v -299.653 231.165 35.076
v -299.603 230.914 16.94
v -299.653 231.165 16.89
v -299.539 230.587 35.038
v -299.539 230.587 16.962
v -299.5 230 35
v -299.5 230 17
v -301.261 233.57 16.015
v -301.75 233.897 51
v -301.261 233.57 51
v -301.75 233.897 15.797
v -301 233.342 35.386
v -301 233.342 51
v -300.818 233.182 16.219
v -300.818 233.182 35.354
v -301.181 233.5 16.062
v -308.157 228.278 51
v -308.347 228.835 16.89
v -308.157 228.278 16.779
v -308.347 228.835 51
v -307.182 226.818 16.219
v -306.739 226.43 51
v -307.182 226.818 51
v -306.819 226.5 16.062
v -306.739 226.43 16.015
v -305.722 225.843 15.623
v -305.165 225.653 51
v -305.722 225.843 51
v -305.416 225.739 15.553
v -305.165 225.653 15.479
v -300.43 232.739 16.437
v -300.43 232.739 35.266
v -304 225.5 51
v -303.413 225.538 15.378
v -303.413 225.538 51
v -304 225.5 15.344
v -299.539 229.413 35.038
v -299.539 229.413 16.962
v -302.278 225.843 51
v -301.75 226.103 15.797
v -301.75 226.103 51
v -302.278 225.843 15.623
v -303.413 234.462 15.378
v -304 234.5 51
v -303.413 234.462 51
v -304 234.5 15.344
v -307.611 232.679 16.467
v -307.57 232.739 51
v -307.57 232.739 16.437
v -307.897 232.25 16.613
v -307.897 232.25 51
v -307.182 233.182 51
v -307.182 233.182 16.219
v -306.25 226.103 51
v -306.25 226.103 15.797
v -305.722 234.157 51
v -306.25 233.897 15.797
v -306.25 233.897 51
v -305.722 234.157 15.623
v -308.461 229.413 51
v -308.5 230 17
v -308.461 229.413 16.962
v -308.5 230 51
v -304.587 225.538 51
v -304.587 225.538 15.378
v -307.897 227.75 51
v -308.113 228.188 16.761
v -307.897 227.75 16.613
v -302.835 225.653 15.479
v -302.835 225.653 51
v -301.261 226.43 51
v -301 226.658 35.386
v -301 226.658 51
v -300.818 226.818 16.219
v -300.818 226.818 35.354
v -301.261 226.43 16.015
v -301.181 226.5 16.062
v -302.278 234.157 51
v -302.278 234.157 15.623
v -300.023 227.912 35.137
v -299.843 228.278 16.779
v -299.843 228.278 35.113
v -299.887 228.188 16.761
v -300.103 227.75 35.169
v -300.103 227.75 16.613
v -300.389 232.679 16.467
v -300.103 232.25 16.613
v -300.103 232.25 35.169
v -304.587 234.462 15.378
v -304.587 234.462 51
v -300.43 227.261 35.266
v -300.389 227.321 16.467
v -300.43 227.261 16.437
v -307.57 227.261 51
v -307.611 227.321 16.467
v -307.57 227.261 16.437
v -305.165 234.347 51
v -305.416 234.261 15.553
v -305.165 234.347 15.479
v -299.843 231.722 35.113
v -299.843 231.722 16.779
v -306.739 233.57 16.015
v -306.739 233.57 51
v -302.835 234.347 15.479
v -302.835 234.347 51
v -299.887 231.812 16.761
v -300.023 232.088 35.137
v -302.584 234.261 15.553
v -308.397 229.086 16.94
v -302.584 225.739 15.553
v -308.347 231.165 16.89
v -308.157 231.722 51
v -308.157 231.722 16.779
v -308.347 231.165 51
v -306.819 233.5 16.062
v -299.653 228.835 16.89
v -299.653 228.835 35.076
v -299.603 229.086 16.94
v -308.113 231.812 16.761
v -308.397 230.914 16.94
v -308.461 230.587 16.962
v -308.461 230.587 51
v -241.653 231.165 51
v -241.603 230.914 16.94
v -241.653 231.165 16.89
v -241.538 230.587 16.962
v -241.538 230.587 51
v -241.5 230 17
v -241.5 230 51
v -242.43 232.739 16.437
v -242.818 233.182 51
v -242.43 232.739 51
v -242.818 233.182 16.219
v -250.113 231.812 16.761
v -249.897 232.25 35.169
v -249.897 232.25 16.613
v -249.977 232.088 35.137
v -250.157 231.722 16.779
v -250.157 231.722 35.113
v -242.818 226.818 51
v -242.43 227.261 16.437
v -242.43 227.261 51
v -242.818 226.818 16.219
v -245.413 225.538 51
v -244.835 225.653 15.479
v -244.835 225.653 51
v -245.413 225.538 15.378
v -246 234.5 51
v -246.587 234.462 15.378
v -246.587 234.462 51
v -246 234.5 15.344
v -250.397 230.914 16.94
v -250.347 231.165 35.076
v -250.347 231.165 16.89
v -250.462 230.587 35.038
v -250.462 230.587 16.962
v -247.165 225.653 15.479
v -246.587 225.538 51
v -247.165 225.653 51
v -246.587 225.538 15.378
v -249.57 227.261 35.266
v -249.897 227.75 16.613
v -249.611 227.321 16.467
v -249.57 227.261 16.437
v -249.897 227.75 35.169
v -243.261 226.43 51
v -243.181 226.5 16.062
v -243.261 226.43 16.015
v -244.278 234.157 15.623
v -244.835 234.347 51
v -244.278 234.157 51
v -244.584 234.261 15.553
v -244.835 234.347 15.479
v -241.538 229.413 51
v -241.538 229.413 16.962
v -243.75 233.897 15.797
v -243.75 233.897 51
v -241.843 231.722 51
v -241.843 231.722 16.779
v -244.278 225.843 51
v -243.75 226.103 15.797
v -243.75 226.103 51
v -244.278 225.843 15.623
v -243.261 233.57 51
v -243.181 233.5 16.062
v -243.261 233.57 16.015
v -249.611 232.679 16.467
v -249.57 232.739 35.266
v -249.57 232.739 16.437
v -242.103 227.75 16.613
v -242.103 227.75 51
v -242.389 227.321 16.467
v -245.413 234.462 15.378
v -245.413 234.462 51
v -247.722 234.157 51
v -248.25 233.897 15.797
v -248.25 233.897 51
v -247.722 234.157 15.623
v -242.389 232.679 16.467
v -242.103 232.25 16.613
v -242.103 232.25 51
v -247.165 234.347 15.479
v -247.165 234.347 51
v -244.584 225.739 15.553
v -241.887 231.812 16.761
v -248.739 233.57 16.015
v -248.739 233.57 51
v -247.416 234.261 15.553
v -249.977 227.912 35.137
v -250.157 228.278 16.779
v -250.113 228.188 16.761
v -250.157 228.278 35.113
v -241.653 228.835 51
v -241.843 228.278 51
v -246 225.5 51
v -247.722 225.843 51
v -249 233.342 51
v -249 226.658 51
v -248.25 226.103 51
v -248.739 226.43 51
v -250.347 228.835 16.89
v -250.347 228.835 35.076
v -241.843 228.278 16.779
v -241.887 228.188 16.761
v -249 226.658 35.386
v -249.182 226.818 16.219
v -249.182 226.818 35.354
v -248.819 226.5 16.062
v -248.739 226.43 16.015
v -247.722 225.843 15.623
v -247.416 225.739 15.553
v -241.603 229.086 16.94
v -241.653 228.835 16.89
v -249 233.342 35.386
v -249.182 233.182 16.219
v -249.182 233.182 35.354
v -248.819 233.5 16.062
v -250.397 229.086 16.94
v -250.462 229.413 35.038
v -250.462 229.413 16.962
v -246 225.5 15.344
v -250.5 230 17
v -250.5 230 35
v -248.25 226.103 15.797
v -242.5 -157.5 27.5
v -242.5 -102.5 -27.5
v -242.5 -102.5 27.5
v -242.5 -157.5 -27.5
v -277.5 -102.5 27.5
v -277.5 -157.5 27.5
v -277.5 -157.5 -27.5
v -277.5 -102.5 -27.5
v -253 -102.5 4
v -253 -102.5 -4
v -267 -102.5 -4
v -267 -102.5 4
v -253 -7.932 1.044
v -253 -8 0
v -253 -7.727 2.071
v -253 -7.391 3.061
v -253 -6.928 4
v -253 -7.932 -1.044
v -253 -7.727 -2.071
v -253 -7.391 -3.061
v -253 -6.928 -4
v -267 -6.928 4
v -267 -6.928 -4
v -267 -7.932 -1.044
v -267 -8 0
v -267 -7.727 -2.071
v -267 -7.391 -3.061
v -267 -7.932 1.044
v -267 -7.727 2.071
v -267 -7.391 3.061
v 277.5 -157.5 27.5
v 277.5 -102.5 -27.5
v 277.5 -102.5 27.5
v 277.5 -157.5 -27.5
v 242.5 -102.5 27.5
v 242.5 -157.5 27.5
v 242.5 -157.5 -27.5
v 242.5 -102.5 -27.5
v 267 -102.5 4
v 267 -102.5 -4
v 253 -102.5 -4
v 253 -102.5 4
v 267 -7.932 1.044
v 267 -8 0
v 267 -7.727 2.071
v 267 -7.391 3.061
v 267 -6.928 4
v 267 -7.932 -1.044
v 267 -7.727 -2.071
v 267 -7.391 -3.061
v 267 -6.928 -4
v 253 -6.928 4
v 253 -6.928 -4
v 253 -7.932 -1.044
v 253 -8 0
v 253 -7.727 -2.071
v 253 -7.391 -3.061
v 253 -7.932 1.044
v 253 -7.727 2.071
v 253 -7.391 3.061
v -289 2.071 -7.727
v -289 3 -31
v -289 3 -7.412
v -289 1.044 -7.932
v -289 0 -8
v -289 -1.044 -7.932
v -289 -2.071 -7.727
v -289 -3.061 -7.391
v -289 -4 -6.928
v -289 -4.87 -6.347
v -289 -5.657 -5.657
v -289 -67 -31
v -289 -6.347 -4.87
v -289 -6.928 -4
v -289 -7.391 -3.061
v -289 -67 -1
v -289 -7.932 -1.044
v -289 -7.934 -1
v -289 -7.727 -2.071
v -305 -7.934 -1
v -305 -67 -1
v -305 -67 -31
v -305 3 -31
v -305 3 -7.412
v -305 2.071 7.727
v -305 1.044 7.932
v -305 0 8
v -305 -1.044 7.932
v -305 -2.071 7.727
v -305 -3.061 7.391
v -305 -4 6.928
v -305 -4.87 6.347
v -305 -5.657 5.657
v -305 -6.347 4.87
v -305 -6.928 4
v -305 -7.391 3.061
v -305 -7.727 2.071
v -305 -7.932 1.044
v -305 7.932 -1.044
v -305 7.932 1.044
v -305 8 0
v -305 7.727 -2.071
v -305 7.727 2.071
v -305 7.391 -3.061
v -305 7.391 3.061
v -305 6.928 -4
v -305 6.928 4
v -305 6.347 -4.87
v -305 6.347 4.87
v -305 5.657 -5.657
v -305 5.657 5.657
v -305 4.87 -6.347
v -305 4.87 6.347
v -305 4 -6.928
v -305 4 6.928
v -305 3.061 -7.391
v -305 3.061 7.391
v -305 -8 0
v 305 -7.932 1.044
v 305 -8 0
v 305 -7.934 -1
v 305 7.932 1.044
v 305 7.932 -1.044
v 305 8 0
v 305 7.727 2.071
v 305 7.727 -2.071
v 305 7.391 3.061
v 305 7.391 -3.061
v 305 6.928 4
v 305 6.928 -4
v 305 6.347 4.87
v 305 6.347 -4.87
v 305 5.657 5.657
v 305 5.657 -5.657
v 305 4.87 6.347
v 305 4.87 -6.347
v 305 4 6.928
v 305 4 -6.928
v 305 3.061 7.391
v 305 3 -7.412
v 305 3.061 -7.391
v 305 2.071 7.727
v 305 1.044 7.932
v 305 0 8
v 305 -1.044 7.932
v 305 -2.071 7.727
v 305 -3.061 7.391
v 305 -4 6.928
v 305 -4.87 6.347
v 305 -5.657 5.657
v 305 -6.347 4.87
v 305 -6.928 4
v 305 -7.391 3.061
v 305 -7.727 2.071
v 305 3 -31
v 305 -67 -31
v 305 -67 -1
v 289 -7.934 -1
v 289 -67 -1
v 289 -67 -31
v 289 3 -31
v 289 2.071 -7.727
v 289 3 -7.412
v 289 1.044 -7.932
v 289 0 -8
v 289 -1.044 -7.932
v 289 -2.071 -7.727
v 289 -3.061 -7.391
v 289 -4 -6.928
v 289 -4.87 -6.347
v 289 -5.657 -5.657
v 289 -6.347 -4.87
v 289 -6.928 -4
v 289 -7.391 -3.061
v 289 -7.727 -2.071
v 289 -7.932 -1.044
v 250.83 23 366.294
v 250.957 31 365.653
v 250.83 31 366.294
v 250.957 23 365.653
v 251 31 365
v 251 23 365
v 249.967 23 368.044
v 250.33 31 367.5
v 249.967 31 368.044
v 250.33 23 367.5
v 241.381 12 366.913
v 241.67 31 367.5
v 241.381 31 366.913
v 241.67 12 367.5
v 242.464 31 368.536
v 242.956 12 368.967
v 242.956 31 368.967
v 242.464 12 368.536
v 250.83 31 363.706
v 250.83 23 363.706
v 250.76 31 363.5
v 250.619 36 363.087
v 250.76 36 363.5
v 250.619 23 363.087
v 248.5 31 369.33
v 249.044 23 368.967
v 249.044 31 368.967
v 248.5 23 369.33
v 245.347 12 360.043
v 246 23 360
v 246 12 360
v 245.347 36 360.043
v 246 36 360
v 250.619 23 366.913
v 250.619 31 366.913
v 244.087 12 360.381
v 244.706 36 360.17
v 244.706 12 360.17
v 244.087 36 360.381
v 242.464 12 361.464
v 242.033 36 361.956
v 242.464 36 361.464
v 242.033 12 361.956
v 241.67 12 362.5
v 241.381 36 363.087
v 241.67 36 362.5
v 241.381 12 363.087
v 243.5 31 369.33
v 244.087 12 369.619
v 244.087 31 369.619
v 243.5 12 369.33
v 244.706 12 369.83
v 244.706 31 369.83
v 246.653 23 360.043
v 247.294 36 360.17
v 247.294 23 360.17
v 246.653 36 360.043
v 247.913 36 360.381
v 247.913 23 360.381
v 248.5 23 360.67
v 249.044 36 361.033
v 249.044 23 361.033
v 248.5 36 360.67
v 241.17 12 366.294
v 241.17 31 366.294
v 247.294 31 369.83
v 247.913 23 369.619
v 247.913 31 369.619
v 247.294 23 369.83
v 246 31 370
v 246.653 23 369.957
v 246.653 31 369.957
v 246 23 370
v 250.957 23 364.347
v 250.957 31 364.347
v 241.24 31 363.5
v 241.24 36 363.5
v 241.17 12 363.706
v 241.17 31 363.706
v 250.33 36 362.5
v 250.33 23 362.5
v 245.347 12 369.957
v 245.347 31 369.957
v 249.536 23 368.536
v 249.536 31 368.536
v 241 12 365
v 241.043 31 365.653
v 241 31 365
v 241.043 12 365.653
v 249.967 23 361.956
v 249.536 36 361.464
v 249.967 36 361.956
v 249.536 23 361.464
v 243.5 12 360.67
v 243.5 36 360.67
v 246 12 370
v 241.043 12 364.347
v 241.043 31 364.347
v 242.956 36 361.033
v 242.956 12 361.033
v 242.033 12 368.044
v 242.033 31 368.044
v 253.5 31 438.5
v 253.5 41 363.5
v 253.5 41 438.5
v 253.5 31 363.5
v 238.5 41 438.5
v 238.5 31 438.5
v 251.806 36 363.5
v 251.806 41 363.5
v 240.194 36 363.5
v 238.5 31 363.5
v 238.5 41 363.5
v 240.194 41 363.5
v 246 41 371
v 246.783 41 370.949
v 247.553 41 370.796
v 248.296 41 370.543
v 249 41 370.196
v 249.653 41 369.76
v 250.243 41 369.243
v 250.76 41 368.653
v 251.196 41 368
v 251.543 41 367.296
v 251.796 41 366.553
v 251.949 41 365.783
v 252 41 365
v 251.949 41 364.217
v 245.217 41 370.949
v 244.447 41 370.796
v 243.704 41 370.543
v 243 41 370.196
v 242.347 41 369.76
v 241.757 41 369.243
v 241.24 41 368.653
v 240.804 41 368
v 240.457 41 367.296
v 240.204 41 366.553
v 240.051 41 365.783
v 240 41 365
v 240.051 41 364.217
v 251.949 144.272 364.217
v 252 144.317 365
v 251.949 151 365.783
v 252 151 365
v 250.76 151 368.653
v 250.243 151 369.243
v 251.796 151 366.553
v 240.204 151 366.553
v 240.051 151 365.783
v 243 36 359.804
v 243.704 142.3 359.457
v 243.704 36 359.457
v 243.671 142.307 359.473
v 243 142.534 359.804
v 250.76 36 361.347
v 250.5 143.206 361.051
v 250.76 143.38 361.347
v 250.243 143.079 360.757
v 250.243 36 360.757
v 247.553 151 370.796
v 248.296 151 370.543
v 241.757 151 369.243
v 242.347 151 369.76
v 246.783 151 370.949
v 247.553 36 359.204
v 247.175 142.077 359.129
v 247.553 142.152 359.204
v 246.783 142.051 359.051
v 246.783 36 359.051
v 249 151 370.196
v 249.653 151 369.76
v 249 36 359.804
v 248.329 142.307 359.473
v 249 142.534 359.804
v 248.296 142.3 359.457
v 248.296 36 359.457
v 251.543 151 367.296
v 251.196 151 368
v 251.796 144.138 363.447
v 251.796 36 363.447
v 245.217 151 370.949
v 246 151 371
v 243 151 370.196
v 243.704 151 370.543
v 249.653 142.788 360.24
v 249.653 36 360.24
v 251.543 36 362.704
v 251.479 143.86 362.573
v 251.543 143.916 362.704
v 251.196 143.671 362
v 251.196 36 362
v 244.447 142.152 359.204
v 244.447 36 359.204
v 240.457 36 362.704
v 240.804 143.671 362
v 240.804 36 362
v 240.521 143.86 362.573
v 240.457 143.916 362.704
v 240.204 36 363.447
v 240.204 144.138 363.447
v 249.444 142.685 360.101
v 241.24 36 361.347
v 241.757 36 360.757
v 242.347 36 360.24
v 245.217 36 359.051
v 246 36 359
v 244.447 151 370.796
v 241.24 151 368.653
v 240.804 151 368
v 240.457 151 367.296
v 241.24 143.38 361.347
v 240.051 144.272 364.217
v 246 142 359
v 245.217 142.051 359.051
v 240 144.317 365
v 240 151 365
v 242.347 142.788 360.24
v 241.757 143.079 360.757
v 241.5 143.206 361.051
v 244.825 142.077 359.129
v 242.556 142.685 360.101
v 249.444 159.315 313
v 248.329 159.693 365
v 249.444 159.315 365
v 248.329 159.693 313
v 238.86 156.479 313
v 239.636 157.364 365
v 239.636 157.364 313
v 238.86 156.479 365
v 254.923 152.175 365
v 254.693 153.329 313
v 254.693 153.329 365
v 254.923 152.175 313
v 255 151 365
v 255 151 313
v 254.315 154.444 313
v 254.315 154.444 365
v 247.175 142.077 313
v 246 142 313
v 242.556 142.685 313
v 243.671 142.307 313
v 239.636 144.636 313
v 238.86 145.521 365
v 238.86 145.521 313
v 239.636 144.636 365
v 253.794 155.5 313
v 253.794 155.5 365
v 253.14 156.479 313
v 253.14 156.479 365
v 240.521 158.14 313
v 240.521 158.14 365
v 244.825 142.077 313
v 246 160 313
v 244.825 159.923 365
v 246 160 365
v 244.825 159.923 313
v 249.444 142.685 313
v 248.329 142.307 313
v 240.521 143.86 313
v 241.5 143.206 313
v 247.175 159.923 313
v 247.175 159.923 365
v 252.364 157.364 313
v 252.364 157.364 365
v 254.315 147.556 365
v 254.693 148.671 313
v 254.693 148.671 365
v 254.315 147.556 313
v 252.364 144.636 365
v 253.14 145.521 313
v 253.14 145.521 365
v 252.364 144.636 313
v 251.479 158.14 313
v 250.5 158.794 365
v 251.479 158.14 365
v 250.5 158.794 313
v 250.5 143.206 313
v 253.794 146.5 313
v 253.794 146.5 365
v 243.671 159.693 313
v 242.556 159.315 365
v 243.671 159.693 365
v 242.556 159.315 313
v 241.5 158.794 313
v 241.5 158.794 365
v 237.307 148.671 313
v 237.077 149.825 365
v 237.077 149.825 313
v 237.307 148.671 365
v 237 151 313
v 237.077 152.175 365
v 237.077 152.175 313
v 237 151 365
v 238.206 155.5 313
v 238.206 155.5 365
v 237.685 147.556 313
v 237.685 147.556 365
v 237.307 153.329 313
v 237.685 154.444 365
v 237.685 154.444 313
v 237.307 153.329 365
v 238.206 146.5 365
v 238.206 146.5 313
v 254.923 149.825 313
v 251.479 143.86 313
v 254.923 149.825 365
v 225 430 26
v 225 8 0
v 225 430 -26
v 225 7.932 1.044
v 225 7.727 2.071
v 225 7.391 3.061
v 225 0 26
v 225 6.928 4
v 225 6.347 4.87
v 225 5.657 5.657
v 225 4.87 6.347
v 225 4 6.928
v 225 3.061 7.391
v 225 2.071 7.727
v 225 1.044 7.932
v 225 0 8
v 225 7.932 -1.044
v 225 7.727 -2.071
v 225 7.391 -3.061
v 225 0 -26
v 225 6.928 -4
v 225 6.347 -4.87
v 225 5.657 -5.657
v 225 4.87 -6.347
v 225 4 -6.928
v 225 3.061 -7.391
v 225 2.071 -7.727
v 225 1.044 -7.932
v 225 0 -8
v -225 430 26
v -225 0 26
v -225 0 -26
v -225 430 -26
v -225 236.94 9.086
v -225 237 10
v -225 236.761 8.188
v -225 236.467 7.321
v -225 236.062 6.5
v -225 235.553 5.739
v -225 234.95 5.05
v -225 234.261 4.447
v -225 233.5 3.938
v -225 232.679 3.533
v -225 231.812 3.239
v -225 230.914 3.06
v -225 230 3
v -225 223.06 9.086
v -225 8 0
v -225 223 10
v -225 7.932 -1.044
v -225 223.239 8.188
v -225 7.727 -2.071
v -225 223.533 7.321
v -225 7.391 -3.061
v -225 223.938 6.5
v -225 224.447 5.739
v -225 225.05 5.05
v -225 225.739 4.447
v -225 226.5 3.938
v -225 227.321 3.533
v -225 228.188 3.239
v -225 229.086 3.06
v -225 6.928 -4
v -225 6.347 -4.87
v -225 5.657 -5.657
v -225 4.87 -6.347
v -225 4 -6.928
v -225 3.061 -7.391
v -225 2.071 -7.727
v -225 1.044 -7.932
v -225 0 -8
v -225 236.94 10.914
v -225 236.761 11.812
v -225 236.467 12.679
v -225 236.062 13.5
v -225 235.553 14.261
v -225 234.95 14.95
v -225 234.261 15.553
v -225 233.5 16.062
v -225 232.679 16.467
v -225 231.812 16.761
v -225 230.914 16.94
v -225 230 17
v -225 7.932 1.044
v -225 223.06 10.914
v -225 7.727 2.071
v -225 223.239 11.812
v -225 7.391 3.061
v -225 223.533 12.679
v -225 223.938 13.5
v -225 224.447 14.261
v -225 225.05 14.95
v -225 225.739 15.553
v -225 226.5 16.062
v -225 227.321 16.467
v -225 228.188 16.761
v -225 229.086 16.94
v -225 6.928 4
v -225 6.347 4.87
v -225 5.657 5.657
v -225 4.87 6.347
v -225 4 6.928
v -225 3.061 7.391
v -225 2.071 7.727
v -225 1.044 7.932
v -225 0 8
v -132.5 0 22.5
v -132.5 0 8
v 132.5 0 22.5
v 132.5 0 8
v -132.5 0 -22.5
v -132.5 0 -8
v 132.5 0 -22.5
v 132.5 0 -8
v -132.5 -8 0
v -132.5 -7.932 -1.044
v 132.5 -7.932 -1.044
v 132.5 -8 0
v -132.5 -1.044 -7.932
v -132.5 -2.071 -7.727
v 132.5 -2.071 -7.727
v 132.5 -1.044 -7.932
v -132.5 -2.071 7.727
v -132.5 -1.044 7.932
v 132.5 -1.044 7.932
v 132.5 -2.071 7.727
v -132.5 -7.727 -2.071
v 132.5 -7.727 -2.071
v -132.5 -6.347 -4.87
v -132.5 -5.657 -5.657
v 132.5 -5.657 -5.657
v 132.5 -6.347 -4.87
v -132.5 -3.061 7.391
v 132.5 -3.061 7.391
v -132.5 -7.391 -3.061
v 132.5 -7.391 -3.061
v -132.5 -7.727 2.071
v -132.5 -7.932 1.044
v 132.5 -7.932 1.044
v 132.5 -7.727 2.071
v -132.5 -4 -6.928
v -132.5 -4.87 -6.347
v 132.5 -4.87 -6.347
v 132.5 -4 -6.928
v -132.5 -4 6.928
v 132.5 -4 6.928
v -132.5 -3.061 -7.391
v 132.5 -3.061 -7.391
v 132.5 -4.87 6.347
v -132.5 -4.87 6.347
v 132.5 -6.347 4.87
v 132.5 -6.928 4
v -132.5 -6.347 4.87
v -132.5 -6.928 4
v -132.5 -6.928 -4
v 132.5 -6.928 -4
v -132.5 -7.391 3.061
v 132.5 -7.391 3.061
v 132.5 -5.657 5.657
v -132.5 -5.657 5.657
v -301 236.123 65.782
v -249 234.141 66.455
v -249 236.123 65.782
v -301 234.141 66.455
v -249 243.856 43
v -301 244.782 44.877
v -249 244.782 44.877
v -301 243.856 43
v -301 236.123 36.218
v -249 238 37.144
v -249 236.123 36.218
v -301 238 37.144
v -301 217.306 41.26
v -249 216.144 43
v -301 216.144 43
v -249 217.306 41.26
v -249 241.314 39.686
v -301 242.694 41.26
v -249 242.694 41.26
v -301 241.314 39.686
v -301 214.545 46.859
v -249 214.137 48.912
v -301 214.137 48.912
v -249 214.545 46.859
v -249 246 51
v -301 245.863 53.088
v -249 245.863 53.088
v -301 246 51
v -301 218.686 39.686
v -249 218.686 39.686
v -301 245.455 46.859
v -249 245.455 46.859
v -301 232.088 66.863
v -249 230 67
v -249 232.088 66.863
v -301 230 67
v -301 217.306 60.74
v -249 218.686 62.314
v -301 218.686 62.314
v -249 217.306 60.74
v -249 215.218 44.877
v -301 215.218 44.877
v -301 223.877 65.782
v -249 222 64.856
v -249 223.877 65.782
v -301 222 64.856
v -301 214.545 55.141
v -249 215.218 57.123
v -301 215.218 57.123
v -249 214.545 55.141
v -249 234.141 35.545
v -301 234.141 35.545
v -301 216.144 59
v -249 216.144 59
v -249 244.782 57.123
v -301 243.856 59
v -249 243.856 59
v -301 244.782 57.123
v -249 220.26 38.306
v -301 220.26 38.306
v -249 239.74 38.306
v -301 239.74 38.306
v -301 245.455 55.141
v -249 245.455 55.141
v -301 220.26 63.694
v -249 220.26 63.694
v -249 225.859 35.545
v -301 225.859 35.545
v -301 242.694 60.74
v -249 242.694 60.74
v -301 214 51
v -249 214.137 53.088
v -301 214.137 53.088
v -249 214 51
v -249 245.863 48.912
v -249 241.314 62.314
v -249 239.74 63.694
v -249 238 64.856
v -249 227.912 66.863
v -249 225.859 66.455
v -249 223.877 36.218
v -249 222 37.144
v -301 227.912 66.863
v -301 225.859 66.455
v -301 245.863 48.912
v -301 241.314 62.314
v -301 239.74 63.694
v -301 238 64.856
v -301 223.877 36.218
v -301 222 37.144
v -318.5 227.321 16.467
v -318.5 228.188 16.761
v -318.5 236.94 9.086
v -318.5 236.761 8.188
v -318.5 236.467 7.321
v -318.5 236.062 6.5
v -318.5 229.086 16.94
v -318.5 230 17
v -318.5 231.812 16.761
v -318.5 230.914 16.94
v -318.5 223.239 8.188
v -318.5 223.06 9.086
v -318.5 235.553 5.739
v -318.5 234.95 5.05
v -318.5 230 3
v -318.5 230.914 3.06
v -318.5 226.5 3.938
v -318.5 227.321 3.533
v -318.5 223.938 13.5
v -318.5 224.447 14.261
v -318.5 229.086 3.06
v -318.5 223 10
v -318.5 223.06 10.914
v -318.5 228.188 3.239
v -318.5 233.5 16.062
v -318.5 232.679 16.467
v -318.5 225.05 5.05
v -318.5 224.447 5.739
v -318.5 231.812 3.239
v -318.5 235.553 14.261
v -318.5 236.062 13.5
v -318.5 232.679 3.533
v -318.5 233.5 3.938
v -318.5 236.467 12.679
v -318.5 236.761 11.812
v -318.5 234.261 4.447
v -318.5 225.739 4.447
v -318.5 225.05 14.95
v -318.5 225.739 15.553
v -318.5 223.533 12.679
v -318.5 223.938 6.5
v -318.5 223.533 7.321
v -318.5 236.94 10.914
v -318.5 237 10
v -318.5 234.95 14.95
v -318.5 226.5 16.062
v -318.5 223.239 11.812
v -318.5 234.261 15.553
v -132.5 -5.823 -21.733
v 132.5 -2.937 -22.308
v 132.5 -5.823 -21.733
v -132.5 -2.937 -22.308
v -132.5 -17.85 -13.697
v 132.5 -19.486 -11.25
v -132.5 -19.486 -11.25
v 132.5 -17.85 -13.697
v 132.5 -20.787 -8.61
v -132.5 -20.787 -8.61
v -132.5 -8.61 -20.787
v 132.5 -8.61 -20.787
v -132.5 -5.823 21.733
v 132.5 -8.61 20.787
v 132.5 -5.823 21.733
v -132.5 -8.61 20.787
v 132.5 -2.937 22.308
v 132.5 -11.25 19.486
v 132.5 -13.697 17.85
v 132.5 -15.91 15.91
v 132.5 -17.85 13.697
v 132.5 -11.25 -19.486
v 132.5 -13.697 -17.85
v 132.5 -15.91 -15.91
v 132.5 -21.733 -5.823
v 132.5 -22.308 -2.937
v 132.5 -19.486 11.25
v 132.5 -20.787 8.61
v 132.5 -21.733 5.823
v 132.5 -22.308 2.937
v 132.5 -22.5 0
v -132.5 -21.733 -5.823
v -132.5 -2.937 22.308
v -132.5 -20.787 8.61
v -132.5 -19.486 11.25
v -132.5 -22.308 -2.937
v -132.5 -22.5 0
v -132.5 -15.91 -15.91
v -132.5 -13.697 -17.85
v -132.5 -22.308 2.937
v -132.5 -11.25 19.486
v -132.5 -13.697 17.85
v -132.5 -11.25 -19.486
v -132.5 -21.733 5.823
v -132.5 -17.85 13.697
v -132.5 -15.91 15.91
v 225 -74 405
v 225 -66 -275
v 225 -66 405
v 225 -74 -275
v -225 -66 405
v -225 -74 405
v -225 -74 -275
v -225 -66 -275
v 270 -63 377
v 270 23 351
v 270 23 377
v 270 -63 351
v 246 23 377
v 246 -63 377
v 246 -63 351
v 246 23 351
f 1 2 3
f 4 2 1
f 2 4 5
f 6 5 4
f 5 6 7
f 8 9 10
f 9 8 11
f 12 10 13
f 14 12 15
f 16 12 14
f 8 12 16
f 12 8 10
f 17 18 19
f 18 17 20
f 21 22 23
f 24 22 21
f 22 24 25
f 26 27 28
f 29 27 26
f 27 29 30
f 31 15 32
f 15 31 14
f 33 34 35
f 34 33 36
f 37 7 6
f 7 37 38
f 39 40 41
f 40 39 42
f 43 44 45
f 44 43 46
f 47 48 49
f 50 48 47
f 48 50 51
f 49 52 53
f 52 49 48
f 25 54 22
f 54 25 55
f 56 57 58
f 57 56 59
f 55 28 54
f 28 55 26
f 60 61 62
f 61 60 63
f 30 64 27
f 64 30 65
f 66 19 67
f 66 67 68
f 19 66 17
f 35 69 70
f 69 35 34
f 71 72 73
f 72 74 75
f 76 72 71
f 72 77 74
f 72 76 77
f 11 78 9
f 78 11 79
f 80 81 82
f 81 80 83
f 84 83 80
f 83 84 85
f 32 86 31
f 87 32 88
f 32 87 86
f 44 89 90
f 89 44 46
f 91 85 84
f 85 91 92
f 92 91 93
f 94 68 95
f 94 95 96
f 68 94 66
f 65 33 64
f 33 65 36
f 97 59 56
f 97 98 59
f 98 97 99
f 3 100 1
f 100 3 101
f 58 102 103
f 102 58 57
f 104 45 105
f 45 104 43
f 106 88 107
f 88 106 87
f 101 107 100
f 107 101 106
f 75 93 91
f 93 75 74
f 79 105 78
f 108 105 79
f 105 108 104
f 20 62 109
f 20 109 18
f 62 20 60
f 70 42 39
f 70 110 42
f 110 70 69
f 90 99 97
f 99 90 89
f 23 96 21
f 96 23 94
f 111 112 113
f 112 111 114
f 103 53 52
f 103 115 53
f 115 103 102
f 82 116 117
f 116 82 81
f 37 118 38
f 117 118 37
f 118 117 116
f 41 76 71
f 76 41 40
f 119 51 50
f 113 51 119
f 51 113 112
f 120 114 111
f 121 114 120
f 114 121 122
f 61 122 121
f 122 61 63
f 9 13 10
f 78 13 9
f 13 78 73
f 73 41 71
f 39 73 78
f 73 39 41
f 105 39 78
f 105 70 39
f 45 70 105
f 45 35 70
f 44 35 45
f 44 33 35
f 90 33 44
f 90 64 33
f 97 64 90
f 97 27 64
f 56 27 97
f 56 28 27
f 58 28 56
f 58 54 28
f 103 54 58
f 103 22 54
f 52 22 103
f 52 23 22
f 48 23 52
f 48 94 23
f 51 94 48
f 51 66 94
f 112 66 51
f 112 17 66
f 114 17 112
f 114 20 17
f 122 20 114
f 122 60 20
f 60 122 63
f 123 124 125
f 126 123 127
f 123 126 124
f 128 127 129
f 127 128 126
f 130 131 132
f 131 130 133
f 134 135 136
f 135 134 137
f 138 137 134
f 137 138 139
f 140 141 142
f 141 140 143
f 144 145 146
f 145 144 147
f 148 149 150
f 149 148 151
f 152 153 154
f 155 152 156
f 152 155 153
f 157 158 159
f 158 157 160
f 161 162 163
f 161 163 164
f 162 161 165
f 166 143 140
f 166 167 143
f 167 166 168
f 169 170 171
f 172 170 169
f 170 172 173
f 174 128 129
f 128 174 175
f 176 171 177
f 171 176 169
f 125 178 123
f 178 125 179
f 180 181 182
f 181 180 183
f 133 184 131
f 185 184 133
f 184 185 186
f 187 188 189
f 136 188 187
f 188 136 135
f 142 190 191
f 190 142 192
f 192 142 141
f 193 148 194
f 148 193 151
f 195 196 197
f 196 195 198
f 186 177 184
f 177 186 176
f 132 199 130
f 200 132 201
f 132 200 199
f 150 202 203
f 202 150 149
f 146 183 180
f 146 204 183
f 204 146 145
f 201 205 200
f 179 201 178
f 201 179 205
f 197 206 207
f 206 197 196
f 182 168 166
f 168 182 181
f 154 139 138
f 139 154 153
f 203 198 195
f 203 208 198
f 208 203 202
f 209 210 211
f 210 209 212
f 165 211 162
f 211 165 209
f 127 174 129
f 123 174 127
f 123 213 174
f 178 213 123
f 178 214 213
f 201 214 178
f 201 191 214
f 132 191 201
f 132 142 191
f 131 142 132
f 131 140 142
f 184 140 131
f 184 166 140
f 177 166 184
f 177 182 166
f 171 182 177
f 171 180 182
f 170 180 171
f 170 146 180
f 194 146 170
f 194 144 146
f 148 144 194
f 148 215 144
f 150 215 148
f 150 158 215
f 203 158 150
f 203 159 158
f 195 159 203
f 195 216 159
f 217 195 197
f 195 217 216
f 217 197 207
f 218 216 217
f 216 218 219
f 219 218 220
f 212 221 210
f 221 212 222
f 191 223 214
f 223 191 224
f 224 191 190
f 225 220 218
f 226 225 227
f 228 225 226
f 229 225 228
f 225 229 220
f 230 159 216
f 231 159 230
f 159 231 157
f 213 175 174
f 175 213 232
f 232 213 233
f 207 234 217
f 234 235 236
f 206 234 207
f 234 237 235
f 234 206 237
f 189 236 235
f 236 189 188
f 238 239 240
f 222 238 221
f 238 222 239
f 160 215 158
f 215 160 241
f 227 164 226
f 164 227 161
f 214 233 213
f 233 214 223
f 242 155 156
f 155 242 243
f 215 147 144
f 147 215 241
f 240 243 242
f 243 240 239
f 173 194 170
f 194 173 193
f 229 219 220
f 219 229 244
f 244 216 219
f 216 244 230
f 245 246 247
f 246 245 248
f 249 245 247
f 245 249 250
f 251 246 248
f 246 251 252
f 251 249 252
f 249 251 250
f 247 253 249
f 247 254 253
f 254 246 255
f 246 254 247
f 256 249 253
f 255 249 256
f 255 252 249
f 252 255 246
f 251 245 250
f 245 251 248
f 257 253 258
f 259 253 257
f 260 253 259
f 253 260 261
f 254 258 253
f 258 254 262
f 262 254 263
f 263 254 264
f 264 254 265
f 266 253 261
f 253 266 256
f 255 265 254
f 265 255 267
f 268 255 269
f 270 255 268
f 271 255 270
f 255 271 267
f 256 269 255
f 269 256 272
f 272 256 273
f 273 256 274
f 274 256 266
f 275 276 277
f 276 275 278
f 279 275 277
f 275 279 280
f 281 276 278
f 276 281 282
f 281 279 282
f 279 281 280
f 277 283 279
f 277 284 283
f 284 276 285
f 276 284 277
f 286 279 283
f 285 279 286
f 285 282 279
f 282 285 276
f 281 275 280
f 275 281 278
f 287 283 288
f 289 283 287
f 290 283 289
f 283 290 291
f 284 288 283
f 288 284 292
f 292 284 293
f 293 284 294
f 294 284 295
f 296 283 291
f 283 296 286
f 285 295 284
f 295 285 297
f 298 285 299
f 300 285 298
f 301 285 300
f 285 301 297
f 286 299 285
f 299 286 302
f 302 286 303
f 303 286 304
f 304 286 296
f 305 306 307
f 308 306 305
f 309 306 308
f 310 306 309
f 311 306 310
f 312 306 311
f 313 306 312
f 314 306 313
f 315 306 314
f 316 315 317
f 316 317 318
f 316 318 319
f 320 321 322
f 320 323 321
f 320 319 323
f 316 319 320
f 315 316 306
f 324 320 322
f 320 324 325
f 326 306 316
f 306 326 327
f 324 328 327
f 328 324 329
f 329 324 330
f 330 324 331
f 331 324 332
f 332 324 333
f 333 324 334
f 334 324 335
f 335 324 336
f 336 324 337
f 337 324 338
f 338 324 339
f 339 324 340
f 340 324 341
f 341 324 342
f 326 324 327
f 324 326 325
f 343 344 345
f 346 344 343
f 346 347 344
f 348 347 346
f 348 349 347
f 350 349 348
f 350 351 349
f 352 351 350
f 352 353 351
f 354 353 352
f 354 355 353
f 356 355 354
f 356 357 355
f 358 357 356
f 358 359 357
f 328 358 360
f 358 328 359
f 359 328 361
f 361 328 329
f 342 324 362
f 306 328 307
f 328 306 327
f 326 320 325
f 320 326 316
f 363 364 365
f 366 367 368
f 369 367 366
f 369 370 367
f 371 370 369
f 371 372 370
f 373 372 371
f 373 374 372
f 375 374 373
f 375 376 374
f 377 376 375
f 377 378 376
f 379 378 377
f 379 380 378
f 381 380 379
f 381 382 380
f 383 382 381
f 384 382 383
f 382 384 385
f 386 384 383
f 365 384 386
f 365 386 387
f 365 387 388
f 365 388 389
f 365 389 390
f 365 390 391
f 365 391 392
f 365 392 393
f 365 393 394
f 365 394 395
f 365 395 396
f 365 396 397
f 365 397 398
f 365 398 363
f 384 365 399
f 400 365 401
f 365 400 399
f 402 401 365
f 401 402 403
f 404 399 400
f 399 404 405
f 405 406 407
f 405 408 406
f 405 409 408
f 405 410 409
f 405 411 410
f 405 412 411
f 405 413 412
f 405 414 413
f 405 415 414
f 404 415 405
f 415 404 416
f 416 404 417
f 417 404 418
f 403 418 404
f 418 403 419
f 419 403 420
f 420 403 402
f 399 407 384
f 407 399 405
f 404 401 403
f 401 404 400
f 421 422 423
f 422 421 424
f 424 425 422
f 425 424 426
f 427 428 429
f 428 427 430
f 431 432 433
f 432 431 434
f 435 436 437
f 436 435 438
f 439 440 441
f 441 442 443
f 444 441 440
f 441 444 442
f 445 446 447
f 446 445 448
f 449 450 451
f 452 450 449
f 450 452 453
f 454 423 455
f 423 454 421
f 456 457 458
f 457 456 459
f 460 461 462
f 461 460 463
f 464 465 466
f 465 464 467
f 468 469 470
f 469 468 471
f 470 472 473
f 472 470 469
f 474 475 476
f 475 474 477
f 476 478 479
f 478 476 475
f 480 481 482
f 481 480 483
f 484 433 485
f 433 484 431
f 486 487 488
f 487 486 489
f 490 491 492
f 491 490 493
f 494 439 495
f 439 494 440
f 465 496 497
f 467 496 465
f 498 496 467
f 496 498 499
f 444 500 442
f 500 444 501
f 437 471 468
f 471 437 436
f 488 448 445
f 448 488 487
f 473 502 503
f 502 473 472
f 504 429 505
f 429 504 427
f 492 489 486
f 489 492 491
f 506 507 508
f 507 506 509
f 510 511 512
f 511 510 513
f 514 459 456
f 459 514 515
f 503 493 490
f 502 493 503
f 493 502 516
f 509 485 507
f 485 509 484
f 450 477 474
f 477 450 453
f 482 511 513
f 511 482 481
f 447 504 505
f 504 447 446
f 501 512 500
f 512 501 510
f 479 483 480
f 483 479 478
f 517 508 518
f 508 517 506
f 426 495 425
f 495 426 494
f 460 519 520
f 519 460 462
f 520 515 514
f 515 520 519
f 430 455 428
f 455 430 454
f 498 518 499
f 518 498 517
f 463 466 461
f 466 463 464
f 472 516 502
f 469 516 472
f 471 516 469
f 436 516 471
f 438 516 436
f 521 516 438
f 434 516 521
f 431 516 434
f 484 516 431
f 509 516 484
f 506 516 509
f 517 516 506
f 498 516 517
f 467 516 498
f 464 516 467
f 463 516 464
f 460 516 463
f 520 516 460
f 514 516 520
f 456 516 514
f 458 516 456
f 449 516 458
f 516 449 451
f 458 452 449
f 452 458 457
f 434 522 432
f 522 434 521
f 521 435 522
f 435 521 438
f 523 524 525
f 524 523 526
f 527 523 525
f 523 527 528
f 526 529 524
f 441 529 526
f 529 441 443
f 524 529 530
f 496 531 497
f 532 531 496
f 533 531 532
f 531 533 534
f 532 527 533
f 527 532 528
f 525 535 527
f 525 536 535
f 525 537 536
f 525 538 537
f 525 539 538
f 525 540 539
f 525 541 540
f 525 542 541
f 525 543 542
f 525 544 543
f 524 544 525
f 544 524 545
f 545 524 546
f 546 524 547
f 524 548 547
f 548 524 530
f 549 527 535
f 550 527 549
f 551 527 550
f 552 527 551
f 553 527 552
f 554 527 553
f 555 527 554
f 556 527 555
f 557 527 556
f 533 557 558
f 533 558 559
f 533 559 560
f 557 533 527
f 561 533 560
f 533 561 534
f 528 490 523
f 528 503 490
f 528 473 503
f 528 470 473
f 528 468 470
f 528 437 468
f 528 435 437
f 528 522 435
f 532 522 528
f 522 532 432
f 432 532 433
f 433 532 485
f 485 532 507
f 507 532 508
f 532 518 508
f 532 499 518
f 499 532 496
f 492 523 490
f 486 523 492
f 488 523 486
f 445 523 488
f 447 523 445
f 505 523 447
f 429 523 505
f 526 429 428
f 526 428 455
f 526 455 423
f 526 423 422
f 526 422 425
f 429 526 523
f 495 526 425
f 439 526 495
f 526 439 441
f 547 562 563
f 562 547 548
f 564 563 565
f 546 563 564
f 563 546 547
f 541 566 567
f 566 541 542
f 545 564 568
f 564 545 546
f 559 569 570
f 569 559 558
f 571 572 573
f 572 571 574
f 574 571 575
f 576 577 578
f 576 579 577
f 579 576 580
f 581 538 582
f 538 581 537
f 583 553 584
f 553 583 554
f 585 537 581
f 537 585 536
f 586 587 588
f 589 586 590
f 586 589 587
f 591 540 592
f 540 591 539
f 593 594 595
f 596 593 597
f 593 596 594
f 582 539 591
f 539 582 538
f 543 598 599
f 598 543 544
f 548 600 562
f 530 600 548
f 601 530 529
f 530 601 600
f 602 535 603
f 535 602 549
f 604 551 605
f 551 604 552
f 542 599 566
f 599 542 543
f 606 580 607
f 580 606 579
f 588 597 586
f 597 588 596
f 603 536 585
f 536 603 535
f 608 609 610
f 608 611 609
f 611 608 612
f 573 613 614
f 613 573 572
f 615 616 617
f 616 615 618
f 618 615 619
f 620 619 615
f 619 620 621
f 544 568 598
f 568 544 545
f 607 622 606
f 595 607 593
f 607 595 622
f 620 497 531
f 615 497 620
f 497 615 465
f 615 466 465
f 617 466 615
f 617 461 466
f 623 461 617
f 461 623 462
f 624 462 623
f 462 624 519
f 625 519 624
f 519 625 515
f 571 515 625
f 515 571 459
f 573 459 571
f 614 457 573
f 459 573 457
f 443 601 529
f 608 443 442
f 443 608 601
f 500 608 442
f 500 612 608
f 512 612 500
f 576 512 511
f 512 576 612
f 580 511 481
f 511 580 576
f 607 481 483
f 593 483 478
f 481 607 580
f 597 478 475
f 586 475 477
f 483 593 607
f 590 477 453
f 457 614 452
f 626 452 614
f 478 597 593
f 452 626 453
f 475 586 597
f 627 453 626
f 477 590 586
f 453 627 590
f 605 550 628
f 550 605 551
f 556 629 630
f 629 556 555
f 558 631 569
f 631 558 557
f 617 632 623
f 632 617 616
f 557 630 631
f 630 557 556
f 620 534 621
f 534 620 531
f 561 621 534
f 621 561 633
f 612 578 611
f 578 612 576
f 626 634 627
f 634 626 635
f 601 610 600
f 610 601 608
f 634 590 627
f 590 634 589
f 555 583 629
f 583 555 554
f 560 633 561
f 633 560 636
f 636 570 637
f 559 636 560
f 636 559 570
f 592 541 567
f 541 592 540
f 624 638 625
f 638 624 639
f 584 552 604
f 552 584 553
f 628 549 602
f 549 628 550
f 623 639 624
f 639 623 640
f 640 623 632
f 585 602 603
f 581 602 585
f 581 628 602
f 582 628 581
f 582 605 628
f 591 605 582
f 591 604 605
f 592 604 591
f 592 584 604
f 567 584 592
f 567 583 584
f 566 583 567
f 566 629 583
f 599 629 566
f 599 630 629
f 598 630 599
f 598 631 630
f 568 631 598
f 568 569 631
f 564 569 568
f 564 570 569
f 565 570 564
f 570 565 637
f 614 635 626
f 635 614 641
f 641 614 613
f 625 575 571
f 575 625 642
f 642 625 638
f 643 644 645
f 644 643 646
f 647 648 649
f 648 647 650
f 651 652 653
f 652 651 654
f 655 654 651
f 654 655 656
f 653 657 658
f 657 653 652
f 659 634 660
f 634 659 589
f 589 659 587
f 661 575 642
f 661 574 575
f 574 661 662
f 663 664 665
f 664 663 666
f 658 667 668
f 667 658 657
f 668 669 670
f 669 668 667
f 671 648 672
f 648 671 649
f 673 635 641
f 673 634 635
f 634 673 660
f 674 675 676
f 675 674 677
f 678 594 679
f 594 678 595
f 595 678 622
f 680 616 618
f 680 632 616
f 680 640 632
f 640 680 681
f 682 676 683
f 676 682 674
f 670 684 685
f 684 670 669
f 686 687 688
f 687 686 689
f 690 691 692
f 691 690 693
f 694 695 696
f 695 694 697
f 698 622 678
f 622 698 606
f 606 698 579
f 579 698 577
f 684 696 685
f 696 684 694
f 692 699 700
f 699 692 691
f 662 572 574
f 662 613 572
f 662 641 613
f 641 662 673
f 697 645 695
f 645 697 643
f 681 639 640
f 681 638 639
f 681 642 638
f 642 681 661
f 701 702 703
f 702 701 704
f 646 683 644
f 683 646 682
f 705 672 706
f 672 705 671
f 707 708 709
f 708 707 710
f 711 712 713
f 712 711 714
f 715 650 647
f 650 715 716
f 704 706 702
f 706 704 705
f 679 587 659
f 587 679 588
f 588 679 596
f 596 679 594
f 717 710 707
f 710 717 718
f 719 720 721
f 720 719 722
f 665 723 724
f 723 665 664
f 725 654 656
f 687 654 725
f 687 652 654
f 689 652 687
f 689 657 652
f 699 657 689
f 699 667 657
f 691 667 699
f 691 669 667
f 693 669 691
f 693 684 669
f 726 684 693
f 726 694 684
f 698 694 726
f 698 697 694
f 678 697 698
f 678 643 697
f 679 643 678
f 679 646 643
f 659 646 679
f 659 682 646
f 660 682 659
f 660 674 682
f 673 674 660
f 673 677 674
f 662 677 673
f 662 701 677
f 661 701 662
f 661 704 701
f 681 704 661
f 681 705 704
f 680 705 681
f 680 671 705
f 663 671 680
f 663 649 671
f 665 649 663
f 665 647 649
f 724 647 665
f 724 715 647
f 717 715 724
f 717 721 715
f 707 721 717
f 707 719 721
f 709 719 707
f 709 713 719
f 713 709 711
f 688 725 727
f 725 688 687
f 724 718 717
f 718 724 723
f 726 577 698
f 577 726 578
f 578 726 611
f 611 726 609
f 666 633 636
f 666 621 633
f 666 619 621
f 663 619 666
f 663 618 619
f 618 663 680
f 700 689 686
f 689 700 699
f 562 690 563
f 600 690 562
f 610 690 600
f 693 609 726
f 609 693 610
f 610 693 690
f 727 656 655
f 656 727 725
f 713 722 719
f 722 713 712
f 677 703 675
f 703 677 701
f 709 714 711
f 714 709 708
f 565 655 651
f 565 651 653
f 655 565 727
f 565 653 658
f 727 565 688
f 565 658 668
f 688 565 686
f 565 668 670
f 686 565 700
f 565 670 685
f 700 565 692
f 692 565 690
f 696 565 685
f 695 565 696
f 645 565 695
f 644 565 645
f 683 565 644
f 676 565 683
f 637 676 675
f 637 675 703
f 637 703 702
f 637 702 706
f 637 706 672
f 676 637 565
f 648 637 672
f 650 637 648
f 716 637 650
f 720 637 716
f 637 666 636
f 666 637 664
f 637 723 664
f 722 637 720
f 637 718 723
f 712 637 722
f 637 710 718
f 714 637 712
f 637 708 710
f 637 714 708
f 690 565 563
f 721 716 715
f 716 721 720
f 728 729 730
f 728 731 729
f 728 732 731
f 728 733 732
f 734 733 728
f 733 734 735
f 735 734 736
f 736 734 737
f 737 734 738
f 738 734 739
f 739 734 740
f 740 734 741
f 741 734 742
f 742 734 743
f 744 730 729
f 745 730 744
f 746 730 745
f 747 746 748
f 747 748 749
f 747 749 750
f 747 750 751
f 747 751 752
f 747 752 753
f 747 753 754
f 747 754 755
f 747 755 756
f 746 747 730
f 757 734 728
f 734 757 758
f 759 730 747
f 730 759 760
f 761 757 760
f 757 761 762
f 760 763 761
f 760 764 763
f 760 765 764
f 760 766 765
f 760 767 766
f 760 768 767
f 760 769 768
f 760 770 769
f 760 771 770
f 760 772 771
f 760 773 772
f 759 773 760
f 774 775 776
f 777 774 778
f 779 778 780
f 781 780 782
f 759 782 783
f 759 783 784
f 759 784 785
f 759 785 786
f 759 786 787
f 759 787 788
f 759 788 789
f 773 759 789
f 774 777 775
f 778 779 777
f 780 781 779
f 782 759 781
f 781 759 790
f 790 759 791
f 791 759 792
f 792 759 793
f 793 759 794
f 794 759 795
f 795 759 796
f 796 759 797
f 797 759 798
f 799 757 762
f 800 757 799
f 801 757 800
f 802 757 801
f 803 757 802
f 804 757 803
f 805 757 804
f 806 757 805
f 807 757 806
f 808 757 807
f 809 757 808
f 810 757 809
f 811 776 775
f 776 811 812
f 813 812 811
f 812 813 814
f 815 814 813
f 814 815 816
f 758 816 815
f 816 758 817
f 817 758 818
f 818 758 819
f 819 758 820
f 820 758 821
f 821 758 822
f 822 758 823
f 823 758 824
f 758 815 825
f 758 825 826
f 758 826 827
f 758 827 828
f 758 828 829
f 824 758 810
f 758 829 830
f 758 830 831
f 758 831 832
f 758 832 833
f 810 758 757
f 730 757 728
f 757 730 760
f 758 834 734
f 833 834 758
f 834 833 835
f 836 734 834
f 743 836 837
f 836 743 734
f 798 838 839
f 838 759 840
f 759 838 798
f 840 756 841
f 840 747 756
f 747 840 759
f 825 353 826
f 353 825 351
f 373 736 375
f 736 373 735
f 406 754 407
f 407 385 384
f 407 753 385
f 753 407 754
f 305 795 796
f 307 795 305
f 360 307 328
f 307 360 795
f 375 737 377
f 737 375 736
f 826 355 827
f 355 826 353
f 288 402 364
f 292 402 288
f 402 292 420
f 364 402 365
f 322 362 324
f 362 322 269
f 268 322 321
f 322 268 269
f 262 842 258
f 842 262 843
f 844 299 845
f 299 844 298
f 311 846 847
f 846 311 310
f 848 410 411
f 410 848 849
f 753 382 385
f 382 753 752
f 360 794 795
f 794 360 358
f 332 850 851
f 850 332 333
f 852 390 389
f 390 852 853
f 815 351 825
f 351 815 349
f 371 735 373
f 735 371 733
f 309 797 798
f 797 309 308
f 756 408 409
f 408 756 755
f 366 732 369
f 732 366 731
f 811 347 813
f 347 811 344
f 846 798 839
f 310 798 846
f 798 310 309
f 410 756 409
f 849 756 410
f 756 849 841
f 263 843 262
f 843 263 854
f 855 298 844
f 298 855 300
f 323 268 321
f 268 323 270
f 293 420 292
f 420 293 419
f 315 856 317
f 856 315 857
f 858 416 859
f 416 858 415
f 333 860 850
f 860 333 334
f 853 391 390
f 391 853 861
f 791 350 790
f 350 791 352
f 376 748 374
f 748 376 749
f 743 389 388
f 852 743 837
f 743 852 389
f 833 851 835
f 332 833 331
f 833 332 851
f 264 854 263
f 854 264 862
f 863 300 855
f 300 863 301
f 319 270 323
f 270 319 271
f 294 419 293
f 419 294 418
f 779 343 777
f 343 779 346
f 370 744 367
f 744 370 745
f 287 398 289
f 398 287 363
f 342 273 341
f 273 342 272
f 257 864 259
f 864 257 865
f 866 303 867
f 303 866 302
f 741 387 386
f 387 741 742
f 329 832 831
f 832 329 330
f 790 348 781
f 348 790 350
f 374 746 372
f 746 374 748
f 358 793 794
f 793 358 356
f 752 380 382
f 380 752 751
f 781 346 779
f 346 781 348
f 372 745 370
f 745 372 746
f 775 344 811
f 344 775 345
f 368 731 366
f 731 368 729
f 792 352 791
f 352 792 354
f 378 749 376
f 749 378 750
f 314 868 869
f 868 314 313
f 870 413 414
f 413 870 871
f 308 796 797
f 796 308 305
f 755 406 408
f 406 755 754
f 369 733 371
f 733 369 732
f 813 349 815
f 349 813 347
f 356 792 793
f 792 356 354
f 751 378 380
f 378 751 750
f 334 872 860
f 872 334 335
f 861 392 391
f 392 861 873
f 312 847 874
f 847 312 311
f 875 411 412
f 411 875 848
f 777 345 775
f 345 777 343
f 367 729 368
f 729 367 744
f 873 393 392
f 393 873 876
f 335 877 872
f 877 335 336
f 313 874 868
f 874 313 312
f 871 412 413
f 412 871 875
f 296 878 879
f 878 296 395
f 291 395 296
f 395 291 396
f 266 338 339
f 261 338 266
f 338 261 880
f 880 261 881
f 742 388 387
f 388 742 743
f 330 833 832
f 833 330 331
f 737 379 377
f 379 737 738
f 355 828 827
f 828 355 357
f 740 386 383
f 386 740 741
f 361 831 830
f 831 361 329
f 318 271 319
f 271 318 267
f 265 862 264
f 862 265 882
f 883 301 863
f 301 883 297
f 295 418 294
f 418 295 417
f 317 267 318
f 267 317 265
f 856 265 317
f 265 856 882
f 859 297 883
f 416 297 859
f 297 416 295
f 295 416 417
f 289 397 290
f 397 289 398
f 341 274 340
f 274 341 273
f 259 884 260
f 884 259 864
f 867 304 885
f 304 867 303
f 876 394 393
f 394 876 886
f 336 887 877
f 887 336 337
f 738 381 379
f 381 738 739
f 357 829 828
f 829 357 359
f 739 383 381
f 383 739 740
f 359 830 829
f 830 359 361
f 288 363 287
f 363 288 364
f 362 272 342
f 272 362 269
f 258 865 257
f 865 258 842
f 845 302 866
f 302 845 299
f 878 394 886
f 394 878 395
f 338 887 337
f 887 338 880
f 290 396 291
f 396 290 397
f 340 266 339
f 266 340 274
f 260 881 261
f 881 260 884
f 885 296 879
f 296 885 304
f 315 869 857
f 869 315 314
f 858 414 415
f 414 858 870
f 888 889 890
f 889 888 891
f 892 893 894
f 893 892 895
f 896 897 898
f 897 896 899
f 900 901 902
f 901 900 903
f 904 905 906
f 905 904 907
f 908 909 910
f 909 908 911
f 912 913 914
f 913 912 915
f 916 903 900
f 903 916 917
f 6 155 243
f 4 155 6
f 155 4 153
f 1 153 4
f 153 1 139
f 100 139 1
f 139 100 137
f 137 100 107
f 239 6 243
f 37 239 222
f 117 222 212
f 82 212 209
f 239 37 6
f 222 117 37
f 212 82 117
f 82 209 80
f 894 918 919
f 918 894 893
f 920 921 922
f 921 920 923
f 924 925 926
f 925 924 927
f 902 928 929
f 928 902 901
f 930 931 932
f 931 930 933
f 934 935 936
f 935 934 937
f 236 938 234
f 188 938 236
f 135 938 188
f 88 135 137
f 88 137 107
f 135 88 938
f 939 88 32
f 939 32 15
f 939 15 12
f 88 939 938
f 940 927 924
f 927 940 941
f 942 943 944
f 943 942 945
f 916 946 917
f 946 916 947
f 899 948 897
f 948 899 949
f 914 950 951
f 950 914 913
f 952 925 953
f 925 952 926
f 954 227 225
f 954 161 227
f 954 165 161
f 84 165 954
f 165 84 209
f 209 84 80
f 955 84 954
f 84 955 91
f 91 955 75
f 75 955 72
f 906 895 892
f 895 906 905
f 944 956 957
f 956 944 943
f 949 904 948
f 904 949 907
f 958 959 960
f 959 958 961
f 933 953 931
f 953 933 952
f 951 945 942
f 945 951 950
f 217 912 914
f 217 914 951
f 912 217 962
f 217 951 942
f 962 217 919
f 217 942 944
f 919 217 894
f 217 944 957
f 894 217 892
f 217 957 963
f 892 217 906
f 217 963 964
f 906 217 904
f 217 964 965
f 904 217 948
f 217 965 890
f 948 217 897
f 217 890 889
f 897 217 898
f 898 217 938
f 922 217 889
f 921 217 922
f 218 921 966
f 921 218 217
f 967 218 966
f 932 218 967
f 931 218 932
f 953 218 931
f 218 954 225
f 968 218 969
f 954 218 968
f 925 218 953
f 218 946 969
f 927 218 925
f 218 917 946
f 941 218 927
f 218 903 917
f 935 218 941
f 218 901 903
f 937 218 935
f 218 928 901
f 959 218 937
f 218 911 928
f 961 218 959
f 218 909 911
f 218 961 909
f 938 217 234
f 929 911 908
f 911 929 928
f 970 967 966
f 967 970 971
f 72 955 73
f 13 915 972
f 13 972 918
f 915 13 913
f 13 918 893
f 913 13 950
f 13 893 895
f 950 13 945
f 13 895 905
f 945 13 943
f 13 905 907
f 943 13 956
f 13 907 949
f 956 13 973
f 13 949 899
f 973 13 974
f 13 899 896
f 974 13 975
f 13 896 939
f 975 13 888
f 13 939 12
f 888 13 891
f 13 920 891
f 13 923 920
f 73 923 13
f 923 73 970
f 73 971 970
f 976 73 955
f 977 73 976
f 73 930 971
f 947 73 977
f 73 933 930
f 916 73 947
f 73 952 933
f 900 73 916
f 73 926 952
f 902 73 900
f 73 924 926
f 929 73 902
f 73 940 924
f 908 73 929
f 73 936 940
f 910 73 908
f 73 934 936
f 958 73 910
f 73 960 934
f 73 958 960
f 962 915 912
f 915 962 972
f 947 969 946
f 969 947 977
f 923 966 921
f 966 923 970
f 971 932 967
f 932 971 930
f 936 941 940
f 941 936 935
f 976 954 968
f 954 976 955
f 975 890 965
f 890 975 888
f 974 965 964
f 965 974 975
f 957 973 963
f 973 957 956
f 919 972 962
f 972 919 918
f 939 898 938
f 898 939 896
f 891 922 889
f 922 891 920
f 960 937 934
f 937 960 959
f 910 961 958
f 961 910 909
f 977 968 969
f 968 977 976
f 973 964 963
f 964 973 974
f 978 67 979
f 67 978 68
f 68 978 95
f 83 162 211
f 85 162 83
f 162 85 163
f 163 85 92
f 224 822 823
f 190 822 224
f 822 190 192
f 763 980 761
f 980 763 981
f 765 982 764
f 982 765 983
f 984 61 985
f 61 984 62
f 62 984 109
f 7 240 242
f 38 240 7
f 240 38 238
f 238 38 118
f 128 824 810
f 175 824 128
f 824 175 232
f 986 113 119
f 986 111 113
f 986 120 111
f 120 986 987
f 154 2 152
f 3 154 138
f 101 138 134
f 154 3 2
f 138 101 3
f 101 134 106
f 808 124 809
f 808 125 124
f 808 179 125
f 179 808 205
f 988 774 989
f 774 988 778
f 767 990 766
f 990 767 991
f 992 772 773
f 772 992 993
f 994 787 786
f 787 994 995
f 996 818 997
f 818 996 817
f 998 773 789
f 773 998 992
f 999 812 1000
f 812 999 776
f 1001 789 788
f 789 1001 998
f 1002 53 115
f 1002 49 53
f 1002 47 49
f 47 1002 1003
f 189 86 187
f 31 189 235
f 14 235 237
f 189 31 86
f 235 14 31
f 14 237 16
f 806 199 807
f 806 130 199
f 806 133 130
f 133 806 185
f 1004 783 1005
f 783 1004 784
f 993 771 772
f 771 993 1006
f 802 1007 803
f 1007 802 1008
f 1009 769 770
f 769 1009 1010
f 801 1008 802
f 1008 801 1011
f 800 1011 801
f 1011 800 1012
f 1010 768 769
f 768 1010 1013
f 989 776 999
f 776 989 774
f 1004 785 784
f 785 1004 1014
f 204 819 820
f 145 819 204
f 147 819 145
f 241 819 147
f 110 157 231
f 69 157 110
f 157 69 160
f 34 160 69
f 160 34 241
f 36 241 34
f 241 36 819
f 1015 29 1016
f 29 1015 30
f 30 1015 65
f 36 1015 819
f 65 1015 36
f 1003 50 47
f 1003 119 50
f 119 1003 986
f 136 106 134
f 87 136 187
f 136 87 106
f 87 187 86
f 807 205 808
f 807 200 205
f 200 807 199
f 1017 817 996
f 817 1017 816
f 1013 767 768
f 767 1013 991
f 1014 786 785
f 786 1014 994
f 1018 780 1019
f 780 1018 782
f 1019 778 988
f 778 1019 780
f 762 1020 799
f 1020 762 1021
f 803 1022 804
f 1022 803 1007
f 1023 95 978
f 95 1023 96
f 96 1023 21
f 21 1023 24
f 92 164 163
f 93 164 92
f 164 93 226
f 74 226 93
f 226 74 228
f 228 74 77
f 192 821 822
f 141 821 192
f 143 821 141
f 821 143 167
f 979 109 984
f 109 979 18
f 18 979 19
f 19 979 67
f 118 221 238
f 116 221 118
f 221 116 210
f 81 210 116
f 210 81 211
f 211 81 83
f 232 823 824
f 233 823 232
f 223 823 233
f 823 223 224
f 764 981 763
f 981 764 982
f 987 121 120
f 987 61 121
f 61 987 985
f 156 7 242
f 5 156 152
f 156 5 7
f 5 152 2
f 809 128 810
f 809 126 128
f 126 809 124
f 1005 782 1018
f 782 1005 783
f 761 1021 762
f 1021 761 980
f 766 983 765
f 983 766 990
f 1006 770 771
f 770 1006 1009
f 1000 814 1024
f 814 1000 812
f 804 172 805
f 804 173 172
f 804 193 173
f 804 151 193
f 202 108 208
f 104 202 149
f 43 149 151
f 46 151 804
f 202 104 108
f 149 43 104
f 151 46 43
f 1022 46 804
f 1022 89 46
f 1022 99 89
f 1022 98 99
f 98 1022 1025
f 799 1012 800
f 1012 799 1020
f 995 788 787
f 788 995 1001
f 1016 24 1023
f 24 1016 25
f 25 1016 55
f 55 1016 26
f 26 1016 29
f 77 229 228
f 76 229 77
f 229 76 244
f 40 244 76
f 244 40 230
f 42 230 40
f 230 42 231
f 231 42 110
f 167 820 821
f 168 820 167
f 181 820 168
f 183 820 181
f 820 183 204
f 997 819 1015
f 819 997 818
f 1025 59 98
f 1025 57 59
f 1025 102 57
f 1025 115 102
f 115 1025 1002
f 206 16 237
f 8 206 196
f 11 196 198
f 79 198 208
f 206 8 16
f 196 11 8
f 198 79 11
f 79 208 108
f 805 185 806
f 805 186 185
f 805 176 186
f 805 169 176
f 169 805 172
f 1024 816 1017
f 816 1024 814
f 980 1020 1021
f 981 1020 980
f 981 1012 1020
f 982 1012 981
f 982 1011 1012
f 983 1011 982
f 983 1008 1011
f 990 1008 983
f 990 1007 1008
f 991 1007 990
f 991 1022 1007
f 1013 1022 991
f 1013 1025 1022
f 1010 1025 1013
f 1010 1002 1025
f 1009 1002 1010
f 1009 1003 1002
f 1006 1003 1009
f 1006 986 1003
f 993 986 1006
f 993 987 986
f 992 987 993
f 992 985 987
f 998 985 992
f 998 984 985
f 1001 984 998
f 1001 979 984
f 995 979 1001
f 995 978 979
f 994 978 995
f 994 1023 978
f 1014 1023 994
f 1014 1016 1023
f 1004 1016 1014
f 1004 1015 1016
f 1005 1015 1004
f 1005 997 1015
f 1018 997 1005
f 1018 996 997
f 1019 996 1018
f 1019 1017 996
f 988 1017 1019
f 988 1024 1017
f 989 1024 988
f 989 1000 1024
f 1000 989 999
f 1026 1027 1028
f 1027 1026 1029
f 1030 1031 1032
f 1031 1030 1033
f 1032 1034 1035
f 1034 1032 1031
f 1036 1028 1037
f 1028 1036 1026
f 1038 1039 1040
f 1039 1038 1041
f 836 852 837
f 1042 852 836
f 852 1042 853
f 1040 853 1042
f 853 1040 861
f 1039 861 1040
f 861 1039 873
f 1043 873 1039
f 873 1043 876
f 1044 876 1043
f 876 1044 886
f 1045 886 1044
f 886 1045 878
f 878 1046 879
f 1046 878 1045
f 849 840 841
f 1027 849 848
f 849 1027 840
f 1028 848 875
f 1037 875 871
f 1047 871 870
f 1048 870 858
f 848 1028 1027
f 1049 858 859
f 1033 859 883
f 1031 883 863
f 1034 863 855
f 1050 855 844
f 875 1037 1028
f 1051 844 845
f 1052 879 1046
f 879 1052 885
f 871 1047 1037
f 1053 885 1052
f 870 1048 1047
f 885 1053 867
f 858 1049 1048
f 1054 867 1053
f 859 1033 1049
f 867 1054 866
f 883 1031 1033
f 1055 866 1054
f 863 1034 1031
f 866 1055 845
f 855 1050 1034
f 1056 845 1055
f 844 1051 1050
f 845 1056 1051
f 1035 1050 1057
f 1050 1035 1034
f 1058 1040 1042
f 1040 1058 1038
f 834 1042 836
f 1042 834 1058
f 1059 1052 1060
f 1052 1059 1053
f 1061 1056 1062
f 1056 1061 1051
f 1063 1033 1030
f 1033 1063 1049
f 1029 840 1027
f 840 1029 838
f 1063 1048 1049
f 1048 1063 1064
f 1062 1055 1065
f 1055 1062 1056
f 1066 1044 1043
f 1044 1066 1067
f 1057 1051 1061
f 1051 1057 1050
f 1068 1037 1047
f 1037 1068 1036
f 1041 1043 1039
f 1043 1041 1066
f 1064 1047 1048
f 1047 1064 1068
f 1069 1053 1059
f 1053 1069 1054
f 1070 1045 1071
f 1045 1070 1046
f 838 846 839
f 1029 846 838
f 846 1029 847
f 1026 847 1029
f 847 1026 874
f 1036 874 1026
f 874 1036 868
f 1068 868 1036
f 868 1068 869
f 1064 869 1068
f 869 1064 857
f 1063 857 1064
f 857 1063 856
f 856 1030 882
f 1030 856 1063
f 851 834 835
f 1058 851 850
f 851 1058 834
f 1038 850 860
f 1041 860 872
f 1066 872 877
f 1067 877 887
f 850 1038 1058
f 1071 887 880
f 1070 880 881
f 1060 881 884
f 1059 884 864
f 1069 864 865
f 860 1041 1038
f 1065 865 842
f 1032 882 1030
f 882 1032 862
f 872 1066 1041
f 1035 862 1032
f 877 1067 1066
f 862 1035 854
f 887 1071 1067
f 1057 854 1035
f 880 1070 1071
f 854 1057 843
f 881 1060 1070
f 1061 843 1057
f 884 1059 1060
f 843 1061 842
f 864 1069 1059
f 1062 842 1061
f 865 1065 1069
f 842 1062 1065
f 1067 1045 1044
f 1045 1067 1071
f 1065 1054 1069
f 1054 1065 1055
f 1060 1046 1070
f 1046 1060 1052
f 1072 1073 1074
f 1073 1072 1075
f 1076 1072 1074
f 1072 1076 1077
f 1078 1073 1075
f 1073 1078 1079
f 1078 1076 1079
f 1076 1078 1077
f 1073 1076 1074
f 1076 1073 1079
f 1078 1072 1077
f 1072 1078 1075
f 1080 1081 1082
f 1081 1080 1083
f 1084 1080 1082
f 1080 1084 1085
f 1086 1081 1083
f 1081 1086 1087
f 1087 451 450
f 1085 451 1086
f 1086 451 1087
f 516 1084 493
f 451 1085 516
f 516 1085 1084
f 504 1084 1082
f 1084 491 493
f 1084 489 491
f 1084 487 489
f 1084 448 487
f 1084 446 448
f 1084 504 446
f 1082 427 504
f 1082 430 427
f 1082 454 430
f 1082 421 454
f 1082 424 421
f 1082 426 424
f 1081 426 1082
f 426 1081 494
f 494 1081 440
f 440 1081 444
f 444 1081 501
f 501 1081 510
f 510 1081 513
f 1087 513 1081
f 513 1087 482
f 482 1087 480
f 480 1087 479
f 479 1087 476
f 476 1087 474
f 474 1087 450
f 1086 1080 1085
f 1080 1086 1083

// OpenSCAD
// Side/front assembly drawing in millimetres. Origin is the seat shaft.
// X is across the seat, U (OpenSCAD Y) is towards the robot, Z is up.
// Drawn at the horizontal reset position, with the keeper open.
$fn = 48;

module block(pos, size) {
    translate(pos) cube(size, center=true);
}

module rod_x(pos, length, diameter) {
    translate(pos) rotate([0, 90, 0]) cylinder(h=length, d=diameter, center=true);
}

module rod_u(pos, length, diameter) {
    translate(pos) rotate([90, 0, 0]) cylinder(h=length, d=diameter, center=true);
}

// Unloaded seat skin envelope, trim positions, and contact rail.
color("lightgrey") block([0, 215, 0], [450, 430, 52]);
rod_x([0, 0, 0], 610, 16);
color("steelblue") rod_x([-275, 230, 51], 52, 32);
for (x = [-304, -246]) translate([x, 230, 31]) cylinder(h=40, d=9, center=true);
rod_x([-251, 230, 10], 135, 14);

// Blocks are nominal envelopes. Trim the actual masses using fixture_balance.py.
for (s = [-1, 1]) {
    color("darkslategrey") block([s*165, 330, 0], [32, 25, 8]);
    color("darkslategrey") block([s*260, -130, 0], [35, 55, 55]);
    block([s*260, -65, 0], [14, 130, 8]);
}
color("darkslategrey") rod_x([0, 0, 0], 265, 45);
// Fixed bearing supports and frame mounting plane.
for (s = [-1, 1]) block([s*297, -32, -16], [16, 70, 30]);
color("grey", .25) block([0, -70, 65], [450, 8, 680]);

// Keeper axle, the finger, and the orange release pad.
translate([246, 36, 365]) {
    rod_u([0, -6, 0], 36, 10);
    color("orange") block([0, 0, 36], [15, 10, 75]);
    rod_u([0, 57.5, 0], 115, 12);
    color("orange") translate([0, 115, -26]) cylinder(h=52, d=18, center=true);
}
block([258, -20, 364], [24, 86, 26]);
